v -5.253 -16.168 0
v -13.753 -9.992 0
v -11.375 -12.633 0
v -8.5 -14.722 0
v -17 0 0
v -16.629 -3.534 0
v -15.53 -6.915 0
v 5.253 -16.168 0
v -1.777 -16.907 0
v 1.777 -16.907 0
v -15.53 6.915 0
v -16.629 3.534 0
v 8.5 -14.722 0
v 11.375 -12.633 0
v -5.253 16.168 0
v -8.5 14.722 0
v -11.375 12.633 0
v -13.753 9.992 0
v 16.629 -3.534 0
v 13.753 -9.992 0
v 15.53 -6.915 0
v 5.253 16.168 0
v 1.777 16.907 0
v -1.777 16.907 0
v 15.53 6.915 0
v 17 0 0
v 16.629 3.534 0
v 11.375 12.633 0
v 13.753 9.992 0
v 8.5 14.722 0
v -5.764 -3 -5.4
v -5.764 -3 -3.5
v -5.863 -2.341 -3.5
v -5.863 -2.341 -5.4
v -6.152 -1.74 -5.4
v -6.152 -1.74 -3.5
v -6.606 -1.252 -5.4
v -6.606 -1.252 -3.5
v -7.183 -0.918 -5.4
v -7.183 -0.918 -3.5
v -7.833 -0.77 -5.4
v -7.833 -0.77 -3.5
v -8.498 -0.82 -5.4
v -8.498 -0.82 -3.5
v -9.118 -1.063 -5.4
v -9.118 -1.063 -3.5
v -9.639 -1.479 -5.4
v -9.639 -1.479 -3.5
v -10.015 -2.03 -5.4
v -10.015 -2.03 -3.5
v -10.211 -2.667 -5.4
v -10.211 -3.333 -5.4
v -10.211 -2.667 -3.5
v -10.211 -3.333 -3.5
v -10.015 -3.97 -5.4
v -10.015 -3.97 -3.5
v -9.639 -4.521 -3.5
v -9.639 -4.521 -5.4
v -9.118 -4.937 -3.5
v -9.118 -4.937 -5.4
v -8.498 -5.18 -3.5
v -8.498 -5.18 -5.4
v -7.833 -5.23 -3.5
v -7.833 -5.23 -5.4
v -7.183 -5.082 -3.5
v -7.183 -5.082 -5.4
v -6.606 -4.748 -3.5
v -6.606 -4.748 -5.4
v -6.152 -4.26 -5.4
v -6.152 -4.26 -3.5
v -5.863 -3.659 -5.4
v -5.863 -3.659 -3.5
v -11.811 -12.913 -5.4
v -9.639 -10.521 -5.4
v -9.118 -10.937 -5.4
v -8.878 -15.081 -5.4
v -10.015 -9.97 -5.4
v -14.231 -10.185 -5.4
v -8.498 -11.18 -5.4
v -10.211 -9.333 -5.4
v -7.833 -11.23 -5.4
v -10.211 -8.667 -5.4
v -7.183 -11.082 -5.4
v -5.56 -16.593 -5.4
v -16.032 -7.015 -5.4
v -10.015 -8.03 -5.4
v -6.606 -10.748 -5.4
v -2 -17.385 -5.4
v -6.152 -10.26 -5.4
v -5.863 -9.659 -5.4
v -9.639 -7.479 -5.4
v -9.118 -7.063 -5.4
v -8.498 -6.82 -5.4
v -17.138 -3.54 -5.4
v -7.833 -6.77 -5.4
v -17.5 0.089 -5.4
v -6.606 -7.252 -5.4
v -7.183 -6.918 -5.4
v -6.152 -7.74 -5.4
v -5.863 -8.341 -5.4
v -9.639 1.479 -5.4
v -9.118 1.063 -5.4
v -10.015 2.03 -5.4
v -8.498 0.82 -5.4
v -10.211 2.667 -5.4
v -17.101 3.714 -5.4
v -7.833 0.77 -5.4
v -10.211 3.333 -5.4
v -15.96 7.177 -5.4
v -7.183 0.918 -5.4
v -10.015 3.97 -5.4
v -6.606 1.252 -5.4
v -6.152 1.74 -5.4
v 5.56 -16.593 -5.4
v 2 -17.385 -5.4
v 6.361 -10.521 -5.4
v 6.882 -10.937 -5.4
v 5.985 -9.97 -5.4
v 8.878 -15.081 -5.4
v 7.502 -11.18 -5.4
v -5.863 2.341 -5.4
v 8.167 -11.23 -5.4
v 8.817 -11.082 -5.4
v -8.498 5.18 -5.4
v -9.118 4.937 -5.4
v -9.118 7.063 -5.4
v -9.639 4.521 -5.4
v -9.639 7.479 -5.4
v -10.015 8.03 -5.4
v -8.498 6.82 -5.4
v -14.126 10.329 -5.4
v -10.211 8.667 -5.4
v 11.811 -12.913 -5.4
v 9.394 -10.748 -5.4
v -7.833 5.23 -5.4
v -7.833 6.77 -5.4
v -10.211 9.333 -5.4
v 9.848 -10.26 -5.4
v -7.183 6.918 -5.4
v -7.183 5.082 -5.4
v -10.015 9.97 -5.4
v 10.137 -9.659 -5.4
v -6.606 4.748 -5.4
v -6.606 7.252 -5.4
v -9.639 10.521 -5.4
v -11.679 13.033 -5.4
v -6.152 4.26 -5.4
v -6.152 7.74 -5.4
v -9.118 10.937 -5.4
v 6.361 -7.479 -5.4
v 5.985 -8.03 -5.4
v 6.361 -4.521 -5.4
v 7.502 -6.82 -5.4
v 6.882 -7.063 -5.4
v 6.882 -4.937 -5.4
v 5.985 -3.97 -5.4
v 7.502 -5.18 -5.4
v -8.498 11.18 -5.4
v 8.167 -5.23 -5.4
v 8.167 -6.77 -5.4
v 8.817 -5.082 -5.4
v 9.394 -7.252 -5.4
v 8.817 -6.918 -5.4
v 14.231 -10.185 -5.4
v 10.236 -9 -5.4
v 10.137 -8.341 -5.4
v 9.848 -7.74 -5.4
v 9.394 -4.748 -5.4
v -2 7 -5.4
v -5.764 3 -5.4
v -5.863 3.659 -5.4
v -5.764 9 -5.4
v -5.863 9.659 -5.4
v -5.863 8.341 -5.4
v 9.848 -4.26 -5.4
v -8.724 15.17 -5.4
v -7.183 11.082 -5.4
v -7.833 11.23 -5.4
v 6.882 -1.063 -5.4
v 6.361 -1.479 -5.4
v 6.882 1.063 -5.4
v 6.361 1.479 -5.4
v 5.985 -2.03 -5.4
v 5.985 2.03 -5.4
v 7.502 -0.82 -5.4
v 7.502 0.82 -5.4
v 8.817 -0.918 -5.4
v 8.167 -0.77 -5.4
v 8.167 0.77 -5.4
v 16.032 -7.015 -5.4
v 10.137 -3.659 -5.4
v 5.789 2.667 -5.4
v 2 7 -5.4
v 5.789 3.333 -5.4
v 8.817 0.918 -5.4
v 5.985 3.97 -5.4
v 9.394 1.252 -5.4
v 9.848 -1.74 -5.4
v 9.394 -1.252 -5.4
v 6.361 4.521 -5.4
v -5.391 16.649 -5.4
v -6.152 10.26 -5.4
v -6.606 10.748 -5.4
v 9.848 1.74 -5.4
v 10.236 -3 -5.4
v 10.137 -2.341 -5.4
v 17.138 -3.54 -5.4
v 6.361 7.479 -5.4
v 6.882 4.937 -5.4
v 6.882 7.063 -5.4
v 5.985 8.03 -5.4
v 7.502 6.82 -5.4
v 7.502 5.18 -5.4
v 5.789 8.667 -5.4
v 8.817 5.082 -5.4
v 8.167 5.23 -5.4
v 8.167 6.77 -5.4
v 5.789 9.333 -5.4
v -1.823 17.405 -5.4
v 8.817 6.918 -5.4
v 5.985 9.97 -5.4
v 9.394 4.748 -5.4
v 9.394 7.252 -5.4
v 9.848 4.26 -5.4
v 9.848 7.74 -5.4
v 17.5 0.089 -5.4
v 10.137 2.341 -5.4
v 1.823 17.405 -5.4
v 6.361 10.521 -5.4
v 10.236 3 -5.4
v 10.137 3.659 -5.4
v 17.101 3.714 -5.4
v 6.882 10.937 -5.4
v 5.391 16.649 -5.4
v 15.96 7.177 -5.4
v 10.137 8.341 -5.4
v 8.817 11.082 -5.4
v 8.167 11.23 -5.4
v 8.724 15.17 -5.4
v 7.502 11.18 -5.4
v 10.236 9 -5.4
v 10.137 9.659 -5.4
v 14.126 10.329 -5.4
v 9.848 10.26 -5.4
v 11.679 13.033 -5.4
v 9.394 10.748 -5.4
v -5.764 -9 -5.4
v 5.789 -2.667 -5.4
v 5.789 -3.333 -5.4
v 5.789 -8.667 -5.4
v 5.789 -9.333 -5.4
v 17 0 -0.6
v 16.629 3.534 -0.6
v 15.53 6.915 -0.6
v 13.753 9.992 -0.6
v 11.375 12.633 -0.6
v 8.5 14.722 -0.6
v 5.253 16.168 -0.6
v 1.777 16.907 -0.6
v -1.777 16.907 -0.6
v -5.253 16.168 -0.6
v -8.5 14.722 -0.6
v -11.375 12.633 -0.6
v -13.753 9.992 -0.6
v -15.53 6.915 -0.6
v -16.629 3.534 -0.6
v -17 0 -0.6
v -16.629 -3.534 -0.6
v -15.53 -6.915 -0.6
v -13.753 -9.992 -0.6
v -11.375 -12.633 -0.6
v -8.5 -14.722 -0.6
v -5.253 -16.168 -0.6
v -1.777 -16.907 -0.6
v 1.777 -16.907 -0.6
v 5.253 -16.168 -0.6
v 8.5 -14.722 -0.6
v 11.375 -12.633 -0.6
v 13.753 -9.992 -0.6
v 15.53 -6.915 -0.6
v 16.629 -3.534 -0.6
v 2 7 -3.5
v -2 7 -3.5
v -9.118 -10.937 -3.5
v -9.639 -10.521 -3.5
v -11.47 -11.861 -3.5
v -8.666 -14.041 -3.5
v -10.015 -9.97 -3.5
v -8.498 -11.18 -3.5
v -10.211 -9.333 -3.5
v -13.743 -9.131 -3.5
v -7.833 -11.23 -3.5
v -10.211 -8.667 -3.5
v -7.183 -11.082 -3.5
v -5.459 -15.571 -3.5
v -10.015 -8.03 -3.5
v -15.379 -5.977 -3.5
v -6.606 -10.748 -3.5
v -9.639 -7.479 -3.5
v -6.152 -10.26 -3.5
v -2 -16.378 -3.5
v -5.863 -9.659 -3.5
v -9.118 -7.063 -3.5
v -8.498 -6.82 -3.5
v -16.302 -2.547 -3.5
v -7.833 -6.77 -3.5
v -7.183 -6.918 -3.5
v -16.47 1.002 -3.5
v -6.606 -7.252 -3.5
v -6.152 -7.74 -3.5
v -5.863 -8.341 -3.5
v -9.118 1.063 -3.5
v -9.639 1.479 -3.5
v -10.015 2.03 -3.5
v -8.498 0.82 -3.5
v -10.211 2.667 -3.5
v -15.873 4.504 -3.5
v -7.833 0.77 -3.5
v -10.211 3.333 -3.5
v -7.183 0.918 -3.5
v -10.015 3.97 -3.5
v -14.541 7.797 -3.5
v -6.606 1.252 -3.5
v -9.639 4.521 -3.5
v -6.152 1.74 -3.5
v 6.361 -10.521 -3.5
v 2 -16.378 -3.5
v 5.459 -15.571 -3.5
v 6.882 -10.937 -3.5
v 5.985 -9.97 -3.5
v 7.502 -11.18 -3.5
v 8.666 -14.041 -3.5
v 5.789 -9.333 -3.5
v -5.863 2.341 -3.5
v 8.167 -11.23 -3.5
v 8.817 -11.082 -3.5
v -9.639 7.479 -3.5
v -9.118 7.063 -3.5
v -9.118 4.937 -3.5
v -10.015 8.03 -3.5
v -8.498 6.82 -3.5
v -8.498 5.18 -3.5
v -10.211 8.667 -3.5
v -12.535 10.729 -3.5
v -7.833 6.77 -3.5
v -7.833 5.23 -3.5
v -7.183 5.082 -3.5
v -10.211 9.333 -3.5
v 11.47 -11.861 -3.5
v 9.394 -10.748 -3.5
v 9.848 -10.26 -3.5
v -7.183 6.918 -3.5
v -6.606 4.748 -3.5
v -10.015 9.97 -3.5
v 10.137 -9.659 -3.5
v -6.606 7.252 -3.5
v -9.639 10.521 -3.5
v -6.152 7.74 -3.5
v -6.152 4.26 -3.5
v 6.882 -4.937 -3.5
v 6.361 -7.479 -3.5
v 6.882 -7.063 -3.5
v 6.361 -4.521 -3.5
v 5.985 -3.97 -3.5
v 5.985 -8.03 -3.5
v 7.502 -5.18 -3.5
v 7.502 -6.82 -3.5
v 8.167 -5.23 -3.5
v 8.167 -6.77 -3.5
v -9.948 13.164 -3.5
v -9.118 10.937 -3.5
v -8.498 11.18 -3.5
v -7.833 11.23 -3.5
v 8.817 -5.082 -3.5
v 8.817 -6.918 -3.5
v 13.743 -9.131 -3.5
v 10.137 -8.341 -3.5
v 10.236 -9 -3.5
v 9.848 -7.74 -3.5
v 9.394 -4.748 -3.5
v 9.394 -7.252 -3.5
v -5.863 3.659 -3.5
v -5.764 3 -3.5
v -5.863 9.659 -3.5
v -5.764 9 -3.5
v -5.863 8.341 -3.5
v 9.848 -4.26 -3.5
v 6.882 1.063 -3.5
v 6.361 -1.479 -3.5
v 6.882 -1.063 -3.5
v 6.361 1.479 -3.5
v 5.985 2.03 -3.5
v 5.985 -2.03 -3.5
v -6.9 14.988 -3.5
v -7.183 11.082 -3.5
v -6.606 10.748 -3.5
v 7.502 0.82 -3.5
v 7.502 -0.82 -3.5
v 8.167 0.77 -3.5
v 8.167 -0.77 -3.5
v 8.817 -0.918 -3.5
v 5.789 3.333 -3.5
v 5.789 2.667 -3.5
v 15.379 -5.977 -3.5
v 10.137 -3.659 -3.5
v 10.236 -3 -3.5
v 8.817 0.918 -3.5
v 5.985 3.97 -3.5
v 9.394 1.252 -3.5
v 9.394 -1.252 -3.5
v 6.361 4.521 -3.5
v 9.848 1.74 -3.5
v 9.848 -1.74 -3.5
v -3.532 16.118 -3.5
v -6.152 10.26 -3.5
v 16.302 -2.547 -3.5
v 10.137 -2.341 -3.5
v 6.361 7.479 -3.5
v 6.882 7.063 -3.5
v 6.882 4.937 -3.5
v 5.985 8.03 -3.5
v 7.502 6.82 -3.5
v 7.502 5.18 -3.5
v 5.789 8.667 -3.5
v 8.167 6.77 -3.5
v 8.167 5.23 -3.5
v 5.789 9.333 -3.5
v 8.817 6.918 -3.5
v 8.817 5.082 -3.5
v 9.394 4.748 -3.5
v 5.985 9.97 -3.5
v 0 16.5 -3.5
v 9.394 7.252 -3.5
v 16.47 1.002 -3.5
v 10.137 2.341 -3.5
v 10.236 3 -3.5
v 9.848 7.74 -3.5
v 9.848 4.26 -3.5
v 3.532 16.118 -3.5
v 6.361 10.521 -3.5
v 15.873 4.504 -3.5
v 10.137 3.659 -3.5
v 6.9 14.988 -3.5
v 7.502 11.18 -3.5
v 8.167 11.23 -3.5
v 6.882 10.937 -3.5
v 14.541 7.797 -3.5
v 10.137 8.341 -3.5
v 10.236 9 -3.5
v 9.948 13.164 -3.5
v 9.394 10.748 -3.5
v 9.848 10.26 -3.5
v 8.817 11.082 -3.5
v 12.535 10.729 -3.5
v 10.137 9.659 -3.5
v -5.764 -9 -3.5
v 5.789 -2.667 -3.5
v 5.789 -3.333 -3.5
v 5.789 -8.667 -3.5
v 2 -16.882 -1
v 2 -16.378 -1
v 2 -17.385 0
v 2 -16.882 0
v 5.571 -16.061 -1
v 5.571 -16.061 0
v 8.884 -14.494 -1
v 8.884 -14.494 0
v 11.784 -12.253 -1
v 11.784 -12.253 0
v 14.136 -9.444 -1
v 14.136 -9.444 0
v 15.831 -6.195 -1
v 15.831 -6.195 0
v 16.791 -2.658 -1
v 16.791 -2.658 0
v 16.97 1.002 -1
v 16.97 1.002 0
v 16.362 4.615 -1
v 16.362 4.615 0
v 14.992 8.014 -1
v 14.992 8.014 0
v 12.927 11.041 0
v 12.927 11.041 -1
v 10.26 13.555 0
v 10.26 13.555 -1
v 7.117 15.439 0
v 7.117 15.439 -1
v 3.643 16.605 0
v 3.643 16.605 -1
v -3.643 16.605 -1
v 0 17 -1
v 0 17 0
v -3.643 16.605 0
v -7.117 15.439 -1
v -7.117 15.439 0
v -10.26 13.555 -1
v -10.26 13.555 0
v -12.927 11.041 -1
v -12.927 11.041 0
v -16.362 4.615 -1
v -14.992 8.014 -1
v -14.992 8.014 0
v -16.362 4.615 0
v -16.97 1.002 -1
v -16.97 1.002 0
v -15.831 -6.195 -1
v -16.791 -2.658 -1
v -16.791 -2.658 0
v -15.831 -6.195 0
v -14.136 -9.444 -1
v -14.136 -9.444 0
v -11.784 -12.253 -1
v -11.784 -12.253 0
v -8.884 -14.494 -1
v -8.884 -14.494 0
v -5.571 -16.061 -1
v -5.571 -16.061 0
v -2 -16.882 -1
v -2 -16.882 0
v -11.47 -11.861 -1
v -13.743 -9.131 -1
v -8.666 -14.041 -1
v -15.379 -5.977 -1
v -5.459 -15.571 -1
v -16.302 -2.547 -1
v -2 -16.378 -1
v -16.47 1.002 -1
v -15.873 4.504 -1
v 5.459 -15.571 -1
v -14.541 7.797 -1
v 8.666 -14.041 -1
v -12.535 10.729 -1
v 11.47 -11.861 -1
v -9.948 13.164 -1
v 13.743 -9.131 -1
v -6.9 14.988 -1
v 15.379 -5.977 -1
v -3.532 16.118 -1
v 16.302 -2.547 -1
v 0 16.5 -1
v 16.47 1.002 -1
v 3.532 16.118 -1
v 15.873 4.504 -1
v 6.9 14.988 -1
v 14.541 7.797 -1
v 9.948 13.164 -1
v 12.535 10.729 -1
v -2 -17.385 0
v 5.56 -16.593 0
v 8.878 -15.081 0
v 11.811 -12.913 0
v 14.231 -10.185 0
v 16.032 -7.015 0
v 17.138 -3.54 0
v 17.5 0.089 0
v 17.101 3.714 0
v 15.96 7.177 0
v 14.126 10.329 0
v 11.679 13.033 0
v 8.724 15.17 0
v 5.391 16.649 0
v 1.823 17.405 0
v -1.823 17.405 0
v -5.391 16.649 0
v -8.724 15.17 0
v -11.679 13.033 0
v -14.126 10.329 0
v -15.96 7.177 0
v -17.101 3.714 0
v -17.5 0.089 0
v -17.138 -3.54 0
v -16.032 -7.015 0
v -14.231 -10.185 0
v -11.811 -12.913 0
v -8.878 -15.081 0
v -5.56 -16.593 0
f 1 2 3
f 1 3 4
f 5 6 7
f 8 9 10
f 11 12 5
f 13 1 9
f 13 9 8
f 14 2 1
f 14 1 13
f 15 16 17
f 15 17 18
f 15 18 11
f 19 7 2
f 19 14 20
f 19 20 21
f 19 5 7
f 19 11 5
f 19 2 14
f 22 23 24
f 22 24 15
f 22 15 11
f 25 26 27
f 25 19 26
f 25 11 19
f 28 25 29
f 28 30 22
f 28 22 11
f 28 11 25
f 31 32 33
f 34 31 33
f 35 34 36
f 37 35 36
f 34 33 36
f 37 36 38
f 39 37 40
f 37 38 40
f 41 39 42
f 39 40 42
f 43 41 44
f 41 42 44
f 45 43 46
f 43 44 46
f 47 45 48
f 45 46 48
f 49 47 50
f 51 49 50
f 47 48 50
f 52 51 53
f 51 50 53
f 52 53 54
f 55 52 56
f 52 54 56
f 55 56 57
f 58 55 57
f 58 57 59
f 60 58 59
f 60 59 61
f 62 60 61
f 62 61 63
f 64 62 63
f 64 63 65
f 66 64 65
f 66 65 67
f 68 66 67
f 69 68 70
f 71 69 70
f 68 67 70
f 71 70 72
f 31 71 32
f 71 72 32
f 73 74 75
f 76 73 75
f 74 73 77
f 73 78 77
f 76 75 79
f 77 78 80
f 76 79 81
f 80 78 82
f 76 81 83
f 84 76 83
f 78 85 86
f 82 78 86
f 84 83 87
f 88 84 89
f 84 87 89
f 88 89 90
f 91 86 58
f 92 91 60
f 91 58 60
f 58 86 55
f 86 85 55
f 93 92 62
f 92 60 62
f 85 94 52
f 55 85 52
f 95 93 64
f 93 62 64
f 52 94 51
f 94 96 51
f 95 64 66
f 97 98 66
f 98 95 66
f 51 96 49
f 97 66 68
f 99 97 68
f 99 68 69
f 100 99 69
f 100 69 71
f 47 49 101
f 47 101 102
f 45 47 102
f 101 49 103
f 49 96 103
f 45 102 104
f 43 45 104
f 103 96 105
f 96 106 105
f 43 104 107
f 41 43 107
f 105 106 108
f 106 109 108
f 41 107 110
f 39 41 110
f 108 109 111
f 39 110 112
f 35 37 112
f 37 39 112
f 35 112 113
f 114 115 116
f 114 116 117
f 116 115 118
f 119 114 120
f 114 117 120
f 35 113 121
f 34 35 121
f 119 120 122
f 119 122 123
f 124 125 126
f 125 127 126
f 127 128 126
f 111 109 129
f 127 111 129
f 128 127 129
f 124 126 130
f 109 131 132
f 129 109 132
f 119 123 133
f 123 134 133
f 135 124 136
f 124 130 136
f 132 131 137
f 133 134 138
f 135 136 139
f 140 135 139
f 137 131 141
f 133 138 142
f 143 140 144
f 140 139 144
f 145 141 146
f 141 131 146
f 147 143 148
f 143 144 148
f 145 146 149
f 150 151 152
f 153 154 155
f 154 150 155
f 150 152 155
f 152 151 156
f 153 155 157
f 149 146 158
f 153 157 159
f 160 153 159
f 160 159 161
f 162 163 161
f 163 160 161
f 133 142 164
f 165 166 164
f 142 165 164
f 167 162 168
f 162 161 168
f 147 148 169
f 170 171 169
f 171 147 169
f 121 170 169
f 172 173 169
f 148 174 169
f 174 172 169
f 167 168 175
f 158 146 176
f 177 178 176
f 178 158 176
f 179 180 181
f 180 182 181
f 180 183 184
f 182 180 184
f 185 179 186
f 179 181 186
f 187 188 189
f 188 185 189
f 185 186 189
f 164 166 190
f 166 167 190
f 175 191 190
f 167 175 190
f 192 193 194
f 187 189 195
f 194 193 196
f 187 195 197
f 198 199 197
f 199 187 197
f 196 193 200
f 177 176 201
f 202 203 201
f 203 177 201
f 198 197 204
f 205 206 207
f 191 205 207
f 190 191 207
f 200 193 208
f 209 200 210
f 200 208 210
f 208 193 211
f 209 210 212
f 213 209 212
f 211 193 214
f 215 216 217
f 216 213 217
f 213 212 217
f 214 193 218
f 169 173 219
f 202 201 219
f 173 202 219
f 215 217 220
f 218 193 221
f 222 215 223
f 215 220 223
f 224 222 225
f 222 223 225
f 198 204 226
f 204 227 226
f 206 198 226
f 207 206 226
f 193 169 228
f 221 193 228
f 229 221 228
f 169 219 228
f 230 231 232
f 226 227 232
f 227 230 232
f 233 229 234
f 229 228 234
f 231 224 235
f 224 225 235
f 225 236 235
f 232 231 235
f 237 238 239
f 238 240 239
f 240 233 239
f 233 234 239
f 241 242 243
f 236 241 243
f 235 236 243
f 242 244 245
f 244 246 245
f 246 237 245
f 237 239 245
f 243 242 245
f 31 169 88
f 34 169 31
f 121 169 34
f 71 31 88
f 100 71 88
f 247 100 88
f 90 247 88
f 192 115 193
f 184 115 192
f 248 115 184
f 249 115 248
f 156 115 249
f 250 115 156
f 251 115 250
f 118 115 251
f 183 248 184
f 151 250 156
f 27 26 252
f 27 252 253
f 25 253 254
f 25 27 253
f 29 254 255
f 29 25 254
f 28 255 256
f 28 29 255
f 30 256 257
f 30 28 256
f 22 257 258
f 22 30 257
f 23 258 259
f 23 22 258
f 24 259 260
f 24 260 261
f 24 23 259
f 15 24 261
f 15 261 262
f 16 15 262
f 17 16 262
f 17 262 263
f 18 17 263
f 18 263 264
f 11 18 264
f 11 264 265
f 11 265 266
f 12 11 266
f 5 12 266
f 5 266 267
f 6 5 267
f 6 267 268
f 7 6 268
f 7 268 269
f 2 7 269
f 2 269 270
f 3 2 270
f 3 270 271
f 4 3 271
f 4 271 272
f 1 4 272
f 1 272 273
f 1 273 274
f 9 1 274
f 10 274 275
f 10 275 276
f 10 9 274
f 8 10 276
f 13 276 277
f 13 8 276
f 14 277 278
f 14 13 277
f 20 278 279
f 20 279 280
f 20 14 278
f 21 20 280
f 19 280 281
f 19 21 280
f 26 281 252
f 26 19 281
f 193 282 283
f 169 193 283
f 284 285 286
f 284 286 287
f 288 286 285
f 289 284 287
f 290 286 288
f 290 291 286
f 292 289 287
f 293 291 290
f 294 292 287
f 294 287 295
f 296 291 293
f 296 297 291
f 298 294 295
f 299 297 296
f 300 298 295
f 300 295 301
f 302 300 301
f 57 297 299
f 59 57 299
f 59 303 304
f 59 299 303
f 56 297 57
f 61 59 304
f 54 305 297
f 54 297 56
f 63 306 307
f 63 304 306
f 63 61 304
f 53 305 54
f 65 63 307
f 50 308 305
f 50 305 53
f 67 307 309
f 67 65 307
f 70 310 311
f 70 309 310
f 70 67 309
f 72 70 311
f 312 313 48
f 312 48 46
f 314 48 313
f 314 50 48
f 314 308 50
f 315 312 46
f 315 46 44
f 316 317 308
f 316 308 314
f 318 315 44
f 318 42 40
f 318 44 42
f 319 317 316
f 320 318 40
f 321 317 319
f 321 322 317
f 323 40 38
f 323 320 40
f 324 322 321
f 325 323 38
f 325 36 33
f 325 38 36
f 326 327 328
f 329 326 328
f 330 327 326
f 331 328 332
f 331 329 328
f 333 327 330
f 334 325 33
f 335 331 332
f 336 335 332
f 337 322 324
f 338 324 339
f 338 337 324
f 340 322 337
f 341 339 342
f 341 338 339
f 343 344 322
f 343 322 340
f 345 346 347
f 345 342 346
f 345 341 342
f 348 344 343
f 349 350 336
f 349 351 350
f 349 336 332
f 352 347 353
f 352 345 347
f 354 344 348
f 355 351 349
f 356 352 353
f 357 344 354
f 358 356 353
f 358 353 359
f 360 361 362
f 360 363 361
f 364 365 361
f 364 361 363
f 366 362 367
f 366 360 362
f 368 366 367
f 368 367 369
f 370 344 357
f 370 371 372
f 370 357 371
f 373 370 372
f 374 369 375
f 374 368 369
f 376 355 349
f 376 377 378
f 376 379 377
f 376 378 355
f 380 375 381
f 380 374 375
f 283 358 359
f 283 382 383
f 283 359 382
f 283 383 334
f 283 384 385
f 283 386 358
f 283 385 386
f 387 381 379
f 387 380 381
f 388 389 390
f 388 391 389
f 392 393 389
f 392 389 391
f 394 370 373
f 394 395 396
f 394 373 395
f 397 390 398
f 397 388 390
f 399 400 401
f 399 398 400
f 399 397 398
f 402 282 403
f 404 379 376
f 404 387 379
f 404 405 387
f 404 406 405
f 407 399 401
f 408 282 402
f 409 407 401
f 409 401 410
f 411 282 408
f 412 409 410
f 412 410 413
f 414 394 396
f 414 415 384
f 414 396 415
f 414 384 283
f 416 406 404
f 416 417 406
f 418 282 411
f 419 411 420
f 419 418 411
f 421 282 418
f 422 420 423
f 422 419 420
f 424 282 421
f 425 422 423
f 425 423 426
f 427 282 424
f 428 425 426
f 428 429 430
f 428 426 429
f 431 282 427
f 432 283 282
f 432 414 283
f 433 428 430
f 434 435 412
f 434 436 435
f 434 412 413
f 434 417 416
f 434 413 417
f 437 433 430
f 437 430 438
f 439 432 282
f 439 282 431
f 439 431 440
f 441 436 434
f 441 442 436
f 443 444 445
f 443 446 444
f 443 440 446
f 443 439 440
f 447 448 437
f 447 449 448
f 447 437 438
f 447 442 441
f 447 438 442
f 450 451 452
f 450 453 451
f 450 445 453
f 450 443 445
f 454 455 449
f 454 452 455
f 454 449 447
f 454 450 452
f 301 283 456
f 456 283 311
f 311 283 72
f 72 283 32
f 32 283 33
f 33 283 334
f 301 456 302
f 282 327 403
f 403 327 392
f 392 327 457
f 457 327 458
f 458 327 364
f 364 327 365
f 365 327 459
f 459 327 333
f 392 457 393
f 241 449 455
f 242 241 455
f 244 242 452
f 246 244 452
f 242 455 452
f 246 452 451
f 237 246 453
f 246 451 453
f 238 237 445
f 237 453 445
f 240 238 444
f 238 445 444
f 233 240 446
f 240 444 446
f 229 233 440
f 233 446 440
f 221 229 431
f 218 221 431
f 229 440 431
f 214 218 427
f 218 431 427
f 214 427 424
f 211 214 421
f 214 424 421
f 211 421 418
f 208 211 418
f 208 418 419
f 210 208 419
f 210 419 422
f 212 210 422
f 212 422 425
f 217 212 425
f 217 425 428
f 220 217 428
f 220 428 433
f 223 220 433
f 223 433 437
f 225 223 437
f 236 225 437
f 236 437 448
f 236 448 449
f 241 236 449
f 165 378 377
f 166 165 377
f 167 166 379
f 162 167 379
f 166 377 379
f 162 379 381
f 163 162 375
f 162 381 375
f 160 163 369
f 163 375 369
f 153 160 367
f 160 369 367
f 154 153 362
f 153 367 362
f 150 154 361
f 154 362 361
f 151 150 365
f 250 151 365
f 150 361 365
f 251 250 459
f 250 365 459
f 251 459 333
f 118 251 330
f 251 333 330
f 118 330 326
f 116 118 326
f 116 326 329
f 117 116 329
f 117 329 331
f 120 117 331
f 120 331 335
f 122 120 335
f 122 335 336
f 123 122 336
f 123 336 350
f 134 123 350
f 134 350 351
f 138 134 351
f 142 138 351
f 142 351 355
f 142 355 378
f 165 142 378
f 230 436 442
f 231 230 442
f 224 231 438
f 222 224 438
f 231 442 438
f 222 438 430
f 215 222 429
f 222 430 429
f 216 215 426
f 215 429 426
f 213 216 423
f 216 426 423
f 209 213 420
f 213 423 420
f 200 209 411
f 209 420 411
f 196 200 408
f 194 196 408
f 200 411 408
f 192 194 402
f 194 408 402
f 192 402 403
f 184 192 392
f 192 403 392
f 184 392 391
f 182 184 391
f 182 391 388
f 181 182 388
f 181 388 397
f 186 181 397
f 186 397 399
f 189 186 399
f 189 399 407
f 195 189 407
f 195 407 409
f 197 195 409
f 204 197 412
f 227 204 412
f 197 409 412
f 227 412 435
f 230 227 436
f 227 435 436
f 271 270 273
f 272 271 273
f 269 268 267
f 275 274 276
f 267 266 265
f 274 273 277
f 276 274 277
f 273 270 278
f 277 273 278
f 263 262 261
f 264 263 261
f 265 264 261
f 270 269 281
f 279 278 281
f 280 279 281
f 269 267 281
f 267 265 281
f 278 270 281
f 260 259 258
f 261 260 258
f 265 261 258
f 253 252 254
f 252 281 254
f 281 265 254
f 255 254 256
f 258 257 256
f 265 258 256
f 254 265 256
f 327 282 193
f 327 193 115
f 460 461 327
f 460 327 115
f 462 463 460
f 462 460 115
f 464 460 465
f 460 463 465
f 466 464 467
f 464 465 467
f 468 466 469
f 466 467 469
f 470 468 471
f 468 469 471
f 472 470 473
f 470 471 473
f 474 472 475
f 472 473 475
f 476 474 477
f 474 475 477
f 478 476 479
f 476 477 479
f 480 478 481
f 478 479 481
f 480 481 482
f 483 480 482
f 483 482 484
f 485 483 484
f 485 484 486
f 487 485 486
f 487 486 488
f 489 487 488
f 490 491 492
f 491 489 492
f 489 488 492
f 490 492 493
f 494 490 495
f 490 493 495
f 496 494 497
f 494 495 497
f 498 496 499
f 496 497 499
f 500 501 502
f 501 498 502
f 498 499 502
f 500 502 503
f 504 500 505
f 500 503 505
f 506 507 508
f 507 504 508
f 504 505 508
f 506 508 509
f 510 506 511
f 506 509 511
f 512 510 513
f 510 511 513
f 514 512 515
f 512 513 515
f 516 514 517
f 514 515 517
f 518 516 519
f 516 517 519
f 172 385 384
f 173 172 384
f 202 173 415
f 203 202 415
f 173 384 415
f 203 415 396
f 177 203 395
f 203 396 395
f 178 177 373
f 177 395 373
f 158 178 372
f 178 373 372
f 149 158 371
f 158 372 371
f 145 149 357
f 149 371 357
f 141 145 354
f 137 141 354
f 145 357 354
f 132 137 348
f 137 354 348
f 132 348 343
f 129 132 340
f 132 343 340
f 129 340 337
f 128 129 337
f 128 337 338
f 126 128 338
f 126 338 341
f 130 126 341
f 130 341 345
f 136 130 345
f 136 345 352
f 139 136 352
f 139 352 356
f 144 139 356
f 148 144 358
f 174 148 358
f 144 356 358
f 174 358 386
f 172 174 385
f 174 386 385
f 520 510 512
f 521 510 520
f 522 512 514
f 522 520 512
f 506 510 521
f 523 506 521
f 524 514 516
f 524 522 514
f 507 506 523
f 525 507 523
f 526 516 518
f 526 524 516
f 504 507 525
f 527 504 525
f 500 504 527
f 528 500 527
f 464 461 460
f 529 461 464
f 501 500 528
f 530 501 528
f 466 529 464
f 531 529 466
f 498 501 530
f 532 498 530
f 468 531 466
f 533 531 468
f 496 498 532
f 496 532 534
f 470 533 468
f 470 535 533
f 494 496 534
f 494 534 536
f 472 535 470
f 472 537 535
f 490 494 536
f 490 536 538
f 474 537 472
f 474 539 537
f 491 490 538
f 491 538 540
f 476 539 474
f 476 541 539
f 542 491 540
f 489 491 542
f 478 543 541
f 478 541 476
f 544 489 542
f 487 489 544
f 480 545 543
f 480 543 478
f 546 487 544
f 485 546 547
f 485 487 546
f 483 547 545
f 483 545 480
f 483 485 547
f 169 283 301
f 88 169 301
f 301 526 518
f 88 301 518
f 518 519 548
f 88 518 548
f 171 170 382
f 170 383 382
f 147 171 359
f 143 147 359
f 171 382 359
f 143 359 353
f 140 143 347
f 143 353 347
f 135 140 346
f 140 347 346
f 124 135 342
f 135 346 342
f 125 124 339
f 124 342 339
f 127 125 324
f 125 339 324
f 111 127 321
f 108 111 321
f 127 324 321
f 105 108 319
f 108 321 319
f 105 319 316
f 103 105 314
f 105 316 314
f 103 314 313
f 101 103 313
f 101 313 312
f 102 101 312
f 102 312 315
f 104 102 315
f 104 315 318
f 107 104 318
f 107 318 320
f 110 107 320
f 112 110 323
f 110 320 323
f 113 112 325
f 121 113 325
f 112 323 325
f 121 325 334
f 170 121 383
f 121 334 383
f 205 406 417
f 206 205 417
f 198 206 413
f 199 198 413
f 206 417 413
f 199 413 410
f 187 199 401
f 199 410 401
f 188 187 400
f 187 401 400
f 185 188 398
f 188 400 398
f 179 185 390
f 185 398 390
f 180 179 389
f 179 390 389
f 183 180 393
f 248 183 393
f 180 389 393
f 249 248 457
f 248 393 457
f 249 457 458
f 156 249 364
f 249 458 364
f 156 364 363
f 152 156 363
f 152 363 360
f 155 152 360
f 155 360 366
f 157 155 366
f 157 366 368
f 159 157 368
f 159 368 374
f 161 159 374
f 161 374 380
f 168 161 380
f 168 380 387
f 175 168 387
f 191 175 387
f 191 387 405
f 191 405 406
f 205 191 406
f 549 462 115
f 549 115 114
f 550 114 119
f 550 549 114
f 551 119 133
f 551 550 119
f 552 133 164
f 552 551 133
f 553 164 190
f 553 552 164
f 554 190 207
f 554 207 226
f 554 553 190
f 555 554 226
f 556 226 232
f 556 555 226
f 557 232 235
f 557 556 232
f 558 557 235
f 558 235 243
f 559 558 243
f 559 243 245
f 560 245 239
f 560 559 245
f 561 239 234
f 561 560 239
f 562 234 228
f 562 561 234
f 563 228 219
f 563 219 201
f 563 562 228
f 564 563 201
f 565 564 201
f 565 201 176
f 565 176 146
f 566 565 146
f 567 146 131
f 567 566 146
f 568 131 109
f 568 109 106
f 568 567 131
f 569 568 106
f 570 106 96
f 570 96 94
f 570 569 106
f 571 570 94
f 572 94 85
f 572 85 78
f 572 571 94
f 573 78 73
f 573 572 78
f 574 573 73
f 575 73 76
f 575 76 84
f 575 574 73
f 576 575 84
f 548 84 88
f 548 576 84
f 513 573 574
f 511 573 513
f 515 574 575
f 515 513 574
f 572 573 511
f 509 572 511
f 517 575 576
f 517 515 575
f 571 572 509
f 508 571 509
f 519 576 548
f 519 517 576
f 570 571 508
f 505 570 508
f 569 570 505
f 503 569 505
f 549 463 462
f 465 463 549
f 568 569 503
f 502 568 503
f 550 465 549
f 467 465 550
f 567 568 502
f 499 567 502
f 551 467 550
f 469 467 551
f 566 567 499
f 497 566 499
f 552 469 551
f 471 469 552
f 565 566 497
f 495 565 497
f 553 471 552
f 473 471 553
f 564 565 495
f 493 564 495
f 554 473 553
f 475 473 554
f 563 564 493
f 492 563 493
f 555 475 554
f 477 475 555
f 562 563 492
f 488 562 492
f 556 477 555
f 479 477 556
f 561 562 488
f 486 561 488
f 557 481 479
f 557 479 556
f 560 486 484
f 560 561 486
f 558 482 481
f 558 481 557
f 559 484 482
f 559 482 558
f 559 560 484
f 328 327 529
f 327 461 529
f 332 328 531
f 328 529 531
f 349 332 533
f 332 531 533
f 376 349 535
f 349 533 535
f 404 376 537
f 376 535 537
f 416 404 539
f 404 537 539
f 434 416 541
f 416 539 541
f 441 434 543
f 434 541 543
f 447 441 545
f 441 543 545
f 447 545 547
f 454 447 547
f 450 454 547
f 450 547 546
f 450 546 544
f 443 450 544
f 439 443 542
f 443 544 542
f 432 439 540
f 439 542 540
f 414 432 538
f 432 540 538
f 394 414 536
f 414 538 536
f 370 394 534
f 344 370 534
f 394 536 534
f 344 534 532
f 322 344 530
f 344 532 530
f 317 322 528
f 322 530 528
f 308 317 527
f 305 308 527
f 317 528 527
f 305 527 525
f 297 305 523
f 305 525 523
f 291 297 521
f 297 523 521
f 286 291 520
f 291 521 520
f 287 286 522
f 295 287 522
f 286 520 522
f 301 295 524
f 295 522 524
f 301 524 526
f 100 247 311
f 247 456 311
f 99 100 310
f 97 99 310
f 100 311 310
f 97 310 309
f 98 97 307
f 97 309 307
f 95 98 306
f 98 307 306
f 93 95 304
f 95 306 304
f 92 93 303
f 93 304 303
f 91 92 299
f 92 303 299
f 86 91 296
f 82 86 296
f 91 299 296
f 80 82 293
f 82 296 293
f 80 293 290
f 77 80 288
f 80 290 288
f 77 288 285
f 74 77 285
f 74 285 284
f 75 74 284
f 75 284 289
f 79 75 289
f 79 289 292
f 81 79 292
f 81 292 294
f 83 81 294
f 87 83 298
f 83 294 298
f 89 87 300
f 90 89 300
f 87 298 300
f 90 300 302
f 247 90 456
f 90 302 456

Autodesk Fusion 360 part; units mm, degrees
sketch "Sketch1" plane through (0, 0, 0) normal (0, 0, 1) x (1, 0, 0)
  circle A0 centre (0, 0) radius 16.5
  circle A1 centre (0, 0) radius 17.5
  circle A2 centre (0, 0) radius 17
  line L0 (0, 7) -> (2, 7)
  line L1 (2, 7) -> (2, -19.5649)
  line L2 (2, -19.5649) -> (0, -19.5649)
  line L3 (0, -19.5649) -> (0, 7)
  line L4 (0, 7) -> (-2, 7)
  line L5 (-2, 7) -> (-2, -19.5649)
  line L6 (-2, -19.5649) -> (0, -19.5649)
  line L7 (0, -19.5649) -> (0, 7)
  circle A3 centre (-8, 9) radius 2.2361
  circle A4 centre (-8, 3) radius 2.2361
  line L8 (-21, 0) -> (23, 0) construction
  circle A5 centre (-8, -9) radius 2.2361
  circle A6 centre (-8, -3) radius 2.2361
  line L9 (0, 20) -> (0, -23) construction
  circle A7 centre (8, 9) radius 2.2361
  circle A8 centre (8, 3) radius 2.2361
  circle A9 centre (8, -3) radius 2.2361
  circle A10 centre (8, -9) radius 2.2361
  dimension "d1" = 33
  dimension "d2" = 35
  dimension "d3" = 34
  dimension "d8" = 2
  dimension "d11" = 0
  dimension "d12" = -6
extrude "Extrude1" add sketch "Sketch1" against normal blind 5.4 contours A0 L0 L1 L4 L5 | A0 A2 L1 L5 | A0 L3 L4 L5 L7 | A0 A2 L3 L5 L7 | A0 A2 L1 L3 L7 | A0 L0 L1 L3 L7 | A1 A2 L1 L5 | A1 A2 L3 L5 L7 | A1 A2 L1 L3 L7 | A3 | A4 | A5 | A6 | A7 | A8 | A9 | A10 makes body 1
extrude "Extrude2" cut sketch "Sketch1" against normal blind 3.5 contours A0 L0 L1 L4 L5 | A0 L3 L4 L5 L7 | A0 A2 L3 L5 L7 | A0 A2 L1 L3 L7 | A0 L0 L1 L3 L7 | A3 | A4 | A5 | A6 | A7 | A8 | A9 | A10 bodies 1
extrude "Extrude3" cut sketch "Sketch1" against normal blind 10 contours A0 L3 L4 L5 L7 | A0 A2 L3 L5 L7 | A0 A2 L1 L3 L7 | A0 L0 L1 L3 L7 | A1 A2 L3 L5 L7 | A1 A2 L1 L3 L7 | A1 L3 L5 L6 L7 | A1 L1 L2 L3 L7 | A3 | A4 | A5 | A6 | A7 | A8 | A9 | A10 bodies 1
extrude "Extrude4" cut sketch "Sketch1" against normal blind 1 contours A0 A2 L1 L5 bodies 1
extrude "Extrude5" add sketch "Sketch1" against normal blind 0.6 separate body contours A0 L0 L1 L4 L5 | A0 A2 L1 L5 | A0 L3 L4 L5 L7 | A0 A2 L3 L5 L7 | A0 A2 L1 L3 L7 | A0 L0 L1 L3 L7 | A3 | A4 | A5 | A6 | A7 | A8 | A9 | A10 makes body 2
